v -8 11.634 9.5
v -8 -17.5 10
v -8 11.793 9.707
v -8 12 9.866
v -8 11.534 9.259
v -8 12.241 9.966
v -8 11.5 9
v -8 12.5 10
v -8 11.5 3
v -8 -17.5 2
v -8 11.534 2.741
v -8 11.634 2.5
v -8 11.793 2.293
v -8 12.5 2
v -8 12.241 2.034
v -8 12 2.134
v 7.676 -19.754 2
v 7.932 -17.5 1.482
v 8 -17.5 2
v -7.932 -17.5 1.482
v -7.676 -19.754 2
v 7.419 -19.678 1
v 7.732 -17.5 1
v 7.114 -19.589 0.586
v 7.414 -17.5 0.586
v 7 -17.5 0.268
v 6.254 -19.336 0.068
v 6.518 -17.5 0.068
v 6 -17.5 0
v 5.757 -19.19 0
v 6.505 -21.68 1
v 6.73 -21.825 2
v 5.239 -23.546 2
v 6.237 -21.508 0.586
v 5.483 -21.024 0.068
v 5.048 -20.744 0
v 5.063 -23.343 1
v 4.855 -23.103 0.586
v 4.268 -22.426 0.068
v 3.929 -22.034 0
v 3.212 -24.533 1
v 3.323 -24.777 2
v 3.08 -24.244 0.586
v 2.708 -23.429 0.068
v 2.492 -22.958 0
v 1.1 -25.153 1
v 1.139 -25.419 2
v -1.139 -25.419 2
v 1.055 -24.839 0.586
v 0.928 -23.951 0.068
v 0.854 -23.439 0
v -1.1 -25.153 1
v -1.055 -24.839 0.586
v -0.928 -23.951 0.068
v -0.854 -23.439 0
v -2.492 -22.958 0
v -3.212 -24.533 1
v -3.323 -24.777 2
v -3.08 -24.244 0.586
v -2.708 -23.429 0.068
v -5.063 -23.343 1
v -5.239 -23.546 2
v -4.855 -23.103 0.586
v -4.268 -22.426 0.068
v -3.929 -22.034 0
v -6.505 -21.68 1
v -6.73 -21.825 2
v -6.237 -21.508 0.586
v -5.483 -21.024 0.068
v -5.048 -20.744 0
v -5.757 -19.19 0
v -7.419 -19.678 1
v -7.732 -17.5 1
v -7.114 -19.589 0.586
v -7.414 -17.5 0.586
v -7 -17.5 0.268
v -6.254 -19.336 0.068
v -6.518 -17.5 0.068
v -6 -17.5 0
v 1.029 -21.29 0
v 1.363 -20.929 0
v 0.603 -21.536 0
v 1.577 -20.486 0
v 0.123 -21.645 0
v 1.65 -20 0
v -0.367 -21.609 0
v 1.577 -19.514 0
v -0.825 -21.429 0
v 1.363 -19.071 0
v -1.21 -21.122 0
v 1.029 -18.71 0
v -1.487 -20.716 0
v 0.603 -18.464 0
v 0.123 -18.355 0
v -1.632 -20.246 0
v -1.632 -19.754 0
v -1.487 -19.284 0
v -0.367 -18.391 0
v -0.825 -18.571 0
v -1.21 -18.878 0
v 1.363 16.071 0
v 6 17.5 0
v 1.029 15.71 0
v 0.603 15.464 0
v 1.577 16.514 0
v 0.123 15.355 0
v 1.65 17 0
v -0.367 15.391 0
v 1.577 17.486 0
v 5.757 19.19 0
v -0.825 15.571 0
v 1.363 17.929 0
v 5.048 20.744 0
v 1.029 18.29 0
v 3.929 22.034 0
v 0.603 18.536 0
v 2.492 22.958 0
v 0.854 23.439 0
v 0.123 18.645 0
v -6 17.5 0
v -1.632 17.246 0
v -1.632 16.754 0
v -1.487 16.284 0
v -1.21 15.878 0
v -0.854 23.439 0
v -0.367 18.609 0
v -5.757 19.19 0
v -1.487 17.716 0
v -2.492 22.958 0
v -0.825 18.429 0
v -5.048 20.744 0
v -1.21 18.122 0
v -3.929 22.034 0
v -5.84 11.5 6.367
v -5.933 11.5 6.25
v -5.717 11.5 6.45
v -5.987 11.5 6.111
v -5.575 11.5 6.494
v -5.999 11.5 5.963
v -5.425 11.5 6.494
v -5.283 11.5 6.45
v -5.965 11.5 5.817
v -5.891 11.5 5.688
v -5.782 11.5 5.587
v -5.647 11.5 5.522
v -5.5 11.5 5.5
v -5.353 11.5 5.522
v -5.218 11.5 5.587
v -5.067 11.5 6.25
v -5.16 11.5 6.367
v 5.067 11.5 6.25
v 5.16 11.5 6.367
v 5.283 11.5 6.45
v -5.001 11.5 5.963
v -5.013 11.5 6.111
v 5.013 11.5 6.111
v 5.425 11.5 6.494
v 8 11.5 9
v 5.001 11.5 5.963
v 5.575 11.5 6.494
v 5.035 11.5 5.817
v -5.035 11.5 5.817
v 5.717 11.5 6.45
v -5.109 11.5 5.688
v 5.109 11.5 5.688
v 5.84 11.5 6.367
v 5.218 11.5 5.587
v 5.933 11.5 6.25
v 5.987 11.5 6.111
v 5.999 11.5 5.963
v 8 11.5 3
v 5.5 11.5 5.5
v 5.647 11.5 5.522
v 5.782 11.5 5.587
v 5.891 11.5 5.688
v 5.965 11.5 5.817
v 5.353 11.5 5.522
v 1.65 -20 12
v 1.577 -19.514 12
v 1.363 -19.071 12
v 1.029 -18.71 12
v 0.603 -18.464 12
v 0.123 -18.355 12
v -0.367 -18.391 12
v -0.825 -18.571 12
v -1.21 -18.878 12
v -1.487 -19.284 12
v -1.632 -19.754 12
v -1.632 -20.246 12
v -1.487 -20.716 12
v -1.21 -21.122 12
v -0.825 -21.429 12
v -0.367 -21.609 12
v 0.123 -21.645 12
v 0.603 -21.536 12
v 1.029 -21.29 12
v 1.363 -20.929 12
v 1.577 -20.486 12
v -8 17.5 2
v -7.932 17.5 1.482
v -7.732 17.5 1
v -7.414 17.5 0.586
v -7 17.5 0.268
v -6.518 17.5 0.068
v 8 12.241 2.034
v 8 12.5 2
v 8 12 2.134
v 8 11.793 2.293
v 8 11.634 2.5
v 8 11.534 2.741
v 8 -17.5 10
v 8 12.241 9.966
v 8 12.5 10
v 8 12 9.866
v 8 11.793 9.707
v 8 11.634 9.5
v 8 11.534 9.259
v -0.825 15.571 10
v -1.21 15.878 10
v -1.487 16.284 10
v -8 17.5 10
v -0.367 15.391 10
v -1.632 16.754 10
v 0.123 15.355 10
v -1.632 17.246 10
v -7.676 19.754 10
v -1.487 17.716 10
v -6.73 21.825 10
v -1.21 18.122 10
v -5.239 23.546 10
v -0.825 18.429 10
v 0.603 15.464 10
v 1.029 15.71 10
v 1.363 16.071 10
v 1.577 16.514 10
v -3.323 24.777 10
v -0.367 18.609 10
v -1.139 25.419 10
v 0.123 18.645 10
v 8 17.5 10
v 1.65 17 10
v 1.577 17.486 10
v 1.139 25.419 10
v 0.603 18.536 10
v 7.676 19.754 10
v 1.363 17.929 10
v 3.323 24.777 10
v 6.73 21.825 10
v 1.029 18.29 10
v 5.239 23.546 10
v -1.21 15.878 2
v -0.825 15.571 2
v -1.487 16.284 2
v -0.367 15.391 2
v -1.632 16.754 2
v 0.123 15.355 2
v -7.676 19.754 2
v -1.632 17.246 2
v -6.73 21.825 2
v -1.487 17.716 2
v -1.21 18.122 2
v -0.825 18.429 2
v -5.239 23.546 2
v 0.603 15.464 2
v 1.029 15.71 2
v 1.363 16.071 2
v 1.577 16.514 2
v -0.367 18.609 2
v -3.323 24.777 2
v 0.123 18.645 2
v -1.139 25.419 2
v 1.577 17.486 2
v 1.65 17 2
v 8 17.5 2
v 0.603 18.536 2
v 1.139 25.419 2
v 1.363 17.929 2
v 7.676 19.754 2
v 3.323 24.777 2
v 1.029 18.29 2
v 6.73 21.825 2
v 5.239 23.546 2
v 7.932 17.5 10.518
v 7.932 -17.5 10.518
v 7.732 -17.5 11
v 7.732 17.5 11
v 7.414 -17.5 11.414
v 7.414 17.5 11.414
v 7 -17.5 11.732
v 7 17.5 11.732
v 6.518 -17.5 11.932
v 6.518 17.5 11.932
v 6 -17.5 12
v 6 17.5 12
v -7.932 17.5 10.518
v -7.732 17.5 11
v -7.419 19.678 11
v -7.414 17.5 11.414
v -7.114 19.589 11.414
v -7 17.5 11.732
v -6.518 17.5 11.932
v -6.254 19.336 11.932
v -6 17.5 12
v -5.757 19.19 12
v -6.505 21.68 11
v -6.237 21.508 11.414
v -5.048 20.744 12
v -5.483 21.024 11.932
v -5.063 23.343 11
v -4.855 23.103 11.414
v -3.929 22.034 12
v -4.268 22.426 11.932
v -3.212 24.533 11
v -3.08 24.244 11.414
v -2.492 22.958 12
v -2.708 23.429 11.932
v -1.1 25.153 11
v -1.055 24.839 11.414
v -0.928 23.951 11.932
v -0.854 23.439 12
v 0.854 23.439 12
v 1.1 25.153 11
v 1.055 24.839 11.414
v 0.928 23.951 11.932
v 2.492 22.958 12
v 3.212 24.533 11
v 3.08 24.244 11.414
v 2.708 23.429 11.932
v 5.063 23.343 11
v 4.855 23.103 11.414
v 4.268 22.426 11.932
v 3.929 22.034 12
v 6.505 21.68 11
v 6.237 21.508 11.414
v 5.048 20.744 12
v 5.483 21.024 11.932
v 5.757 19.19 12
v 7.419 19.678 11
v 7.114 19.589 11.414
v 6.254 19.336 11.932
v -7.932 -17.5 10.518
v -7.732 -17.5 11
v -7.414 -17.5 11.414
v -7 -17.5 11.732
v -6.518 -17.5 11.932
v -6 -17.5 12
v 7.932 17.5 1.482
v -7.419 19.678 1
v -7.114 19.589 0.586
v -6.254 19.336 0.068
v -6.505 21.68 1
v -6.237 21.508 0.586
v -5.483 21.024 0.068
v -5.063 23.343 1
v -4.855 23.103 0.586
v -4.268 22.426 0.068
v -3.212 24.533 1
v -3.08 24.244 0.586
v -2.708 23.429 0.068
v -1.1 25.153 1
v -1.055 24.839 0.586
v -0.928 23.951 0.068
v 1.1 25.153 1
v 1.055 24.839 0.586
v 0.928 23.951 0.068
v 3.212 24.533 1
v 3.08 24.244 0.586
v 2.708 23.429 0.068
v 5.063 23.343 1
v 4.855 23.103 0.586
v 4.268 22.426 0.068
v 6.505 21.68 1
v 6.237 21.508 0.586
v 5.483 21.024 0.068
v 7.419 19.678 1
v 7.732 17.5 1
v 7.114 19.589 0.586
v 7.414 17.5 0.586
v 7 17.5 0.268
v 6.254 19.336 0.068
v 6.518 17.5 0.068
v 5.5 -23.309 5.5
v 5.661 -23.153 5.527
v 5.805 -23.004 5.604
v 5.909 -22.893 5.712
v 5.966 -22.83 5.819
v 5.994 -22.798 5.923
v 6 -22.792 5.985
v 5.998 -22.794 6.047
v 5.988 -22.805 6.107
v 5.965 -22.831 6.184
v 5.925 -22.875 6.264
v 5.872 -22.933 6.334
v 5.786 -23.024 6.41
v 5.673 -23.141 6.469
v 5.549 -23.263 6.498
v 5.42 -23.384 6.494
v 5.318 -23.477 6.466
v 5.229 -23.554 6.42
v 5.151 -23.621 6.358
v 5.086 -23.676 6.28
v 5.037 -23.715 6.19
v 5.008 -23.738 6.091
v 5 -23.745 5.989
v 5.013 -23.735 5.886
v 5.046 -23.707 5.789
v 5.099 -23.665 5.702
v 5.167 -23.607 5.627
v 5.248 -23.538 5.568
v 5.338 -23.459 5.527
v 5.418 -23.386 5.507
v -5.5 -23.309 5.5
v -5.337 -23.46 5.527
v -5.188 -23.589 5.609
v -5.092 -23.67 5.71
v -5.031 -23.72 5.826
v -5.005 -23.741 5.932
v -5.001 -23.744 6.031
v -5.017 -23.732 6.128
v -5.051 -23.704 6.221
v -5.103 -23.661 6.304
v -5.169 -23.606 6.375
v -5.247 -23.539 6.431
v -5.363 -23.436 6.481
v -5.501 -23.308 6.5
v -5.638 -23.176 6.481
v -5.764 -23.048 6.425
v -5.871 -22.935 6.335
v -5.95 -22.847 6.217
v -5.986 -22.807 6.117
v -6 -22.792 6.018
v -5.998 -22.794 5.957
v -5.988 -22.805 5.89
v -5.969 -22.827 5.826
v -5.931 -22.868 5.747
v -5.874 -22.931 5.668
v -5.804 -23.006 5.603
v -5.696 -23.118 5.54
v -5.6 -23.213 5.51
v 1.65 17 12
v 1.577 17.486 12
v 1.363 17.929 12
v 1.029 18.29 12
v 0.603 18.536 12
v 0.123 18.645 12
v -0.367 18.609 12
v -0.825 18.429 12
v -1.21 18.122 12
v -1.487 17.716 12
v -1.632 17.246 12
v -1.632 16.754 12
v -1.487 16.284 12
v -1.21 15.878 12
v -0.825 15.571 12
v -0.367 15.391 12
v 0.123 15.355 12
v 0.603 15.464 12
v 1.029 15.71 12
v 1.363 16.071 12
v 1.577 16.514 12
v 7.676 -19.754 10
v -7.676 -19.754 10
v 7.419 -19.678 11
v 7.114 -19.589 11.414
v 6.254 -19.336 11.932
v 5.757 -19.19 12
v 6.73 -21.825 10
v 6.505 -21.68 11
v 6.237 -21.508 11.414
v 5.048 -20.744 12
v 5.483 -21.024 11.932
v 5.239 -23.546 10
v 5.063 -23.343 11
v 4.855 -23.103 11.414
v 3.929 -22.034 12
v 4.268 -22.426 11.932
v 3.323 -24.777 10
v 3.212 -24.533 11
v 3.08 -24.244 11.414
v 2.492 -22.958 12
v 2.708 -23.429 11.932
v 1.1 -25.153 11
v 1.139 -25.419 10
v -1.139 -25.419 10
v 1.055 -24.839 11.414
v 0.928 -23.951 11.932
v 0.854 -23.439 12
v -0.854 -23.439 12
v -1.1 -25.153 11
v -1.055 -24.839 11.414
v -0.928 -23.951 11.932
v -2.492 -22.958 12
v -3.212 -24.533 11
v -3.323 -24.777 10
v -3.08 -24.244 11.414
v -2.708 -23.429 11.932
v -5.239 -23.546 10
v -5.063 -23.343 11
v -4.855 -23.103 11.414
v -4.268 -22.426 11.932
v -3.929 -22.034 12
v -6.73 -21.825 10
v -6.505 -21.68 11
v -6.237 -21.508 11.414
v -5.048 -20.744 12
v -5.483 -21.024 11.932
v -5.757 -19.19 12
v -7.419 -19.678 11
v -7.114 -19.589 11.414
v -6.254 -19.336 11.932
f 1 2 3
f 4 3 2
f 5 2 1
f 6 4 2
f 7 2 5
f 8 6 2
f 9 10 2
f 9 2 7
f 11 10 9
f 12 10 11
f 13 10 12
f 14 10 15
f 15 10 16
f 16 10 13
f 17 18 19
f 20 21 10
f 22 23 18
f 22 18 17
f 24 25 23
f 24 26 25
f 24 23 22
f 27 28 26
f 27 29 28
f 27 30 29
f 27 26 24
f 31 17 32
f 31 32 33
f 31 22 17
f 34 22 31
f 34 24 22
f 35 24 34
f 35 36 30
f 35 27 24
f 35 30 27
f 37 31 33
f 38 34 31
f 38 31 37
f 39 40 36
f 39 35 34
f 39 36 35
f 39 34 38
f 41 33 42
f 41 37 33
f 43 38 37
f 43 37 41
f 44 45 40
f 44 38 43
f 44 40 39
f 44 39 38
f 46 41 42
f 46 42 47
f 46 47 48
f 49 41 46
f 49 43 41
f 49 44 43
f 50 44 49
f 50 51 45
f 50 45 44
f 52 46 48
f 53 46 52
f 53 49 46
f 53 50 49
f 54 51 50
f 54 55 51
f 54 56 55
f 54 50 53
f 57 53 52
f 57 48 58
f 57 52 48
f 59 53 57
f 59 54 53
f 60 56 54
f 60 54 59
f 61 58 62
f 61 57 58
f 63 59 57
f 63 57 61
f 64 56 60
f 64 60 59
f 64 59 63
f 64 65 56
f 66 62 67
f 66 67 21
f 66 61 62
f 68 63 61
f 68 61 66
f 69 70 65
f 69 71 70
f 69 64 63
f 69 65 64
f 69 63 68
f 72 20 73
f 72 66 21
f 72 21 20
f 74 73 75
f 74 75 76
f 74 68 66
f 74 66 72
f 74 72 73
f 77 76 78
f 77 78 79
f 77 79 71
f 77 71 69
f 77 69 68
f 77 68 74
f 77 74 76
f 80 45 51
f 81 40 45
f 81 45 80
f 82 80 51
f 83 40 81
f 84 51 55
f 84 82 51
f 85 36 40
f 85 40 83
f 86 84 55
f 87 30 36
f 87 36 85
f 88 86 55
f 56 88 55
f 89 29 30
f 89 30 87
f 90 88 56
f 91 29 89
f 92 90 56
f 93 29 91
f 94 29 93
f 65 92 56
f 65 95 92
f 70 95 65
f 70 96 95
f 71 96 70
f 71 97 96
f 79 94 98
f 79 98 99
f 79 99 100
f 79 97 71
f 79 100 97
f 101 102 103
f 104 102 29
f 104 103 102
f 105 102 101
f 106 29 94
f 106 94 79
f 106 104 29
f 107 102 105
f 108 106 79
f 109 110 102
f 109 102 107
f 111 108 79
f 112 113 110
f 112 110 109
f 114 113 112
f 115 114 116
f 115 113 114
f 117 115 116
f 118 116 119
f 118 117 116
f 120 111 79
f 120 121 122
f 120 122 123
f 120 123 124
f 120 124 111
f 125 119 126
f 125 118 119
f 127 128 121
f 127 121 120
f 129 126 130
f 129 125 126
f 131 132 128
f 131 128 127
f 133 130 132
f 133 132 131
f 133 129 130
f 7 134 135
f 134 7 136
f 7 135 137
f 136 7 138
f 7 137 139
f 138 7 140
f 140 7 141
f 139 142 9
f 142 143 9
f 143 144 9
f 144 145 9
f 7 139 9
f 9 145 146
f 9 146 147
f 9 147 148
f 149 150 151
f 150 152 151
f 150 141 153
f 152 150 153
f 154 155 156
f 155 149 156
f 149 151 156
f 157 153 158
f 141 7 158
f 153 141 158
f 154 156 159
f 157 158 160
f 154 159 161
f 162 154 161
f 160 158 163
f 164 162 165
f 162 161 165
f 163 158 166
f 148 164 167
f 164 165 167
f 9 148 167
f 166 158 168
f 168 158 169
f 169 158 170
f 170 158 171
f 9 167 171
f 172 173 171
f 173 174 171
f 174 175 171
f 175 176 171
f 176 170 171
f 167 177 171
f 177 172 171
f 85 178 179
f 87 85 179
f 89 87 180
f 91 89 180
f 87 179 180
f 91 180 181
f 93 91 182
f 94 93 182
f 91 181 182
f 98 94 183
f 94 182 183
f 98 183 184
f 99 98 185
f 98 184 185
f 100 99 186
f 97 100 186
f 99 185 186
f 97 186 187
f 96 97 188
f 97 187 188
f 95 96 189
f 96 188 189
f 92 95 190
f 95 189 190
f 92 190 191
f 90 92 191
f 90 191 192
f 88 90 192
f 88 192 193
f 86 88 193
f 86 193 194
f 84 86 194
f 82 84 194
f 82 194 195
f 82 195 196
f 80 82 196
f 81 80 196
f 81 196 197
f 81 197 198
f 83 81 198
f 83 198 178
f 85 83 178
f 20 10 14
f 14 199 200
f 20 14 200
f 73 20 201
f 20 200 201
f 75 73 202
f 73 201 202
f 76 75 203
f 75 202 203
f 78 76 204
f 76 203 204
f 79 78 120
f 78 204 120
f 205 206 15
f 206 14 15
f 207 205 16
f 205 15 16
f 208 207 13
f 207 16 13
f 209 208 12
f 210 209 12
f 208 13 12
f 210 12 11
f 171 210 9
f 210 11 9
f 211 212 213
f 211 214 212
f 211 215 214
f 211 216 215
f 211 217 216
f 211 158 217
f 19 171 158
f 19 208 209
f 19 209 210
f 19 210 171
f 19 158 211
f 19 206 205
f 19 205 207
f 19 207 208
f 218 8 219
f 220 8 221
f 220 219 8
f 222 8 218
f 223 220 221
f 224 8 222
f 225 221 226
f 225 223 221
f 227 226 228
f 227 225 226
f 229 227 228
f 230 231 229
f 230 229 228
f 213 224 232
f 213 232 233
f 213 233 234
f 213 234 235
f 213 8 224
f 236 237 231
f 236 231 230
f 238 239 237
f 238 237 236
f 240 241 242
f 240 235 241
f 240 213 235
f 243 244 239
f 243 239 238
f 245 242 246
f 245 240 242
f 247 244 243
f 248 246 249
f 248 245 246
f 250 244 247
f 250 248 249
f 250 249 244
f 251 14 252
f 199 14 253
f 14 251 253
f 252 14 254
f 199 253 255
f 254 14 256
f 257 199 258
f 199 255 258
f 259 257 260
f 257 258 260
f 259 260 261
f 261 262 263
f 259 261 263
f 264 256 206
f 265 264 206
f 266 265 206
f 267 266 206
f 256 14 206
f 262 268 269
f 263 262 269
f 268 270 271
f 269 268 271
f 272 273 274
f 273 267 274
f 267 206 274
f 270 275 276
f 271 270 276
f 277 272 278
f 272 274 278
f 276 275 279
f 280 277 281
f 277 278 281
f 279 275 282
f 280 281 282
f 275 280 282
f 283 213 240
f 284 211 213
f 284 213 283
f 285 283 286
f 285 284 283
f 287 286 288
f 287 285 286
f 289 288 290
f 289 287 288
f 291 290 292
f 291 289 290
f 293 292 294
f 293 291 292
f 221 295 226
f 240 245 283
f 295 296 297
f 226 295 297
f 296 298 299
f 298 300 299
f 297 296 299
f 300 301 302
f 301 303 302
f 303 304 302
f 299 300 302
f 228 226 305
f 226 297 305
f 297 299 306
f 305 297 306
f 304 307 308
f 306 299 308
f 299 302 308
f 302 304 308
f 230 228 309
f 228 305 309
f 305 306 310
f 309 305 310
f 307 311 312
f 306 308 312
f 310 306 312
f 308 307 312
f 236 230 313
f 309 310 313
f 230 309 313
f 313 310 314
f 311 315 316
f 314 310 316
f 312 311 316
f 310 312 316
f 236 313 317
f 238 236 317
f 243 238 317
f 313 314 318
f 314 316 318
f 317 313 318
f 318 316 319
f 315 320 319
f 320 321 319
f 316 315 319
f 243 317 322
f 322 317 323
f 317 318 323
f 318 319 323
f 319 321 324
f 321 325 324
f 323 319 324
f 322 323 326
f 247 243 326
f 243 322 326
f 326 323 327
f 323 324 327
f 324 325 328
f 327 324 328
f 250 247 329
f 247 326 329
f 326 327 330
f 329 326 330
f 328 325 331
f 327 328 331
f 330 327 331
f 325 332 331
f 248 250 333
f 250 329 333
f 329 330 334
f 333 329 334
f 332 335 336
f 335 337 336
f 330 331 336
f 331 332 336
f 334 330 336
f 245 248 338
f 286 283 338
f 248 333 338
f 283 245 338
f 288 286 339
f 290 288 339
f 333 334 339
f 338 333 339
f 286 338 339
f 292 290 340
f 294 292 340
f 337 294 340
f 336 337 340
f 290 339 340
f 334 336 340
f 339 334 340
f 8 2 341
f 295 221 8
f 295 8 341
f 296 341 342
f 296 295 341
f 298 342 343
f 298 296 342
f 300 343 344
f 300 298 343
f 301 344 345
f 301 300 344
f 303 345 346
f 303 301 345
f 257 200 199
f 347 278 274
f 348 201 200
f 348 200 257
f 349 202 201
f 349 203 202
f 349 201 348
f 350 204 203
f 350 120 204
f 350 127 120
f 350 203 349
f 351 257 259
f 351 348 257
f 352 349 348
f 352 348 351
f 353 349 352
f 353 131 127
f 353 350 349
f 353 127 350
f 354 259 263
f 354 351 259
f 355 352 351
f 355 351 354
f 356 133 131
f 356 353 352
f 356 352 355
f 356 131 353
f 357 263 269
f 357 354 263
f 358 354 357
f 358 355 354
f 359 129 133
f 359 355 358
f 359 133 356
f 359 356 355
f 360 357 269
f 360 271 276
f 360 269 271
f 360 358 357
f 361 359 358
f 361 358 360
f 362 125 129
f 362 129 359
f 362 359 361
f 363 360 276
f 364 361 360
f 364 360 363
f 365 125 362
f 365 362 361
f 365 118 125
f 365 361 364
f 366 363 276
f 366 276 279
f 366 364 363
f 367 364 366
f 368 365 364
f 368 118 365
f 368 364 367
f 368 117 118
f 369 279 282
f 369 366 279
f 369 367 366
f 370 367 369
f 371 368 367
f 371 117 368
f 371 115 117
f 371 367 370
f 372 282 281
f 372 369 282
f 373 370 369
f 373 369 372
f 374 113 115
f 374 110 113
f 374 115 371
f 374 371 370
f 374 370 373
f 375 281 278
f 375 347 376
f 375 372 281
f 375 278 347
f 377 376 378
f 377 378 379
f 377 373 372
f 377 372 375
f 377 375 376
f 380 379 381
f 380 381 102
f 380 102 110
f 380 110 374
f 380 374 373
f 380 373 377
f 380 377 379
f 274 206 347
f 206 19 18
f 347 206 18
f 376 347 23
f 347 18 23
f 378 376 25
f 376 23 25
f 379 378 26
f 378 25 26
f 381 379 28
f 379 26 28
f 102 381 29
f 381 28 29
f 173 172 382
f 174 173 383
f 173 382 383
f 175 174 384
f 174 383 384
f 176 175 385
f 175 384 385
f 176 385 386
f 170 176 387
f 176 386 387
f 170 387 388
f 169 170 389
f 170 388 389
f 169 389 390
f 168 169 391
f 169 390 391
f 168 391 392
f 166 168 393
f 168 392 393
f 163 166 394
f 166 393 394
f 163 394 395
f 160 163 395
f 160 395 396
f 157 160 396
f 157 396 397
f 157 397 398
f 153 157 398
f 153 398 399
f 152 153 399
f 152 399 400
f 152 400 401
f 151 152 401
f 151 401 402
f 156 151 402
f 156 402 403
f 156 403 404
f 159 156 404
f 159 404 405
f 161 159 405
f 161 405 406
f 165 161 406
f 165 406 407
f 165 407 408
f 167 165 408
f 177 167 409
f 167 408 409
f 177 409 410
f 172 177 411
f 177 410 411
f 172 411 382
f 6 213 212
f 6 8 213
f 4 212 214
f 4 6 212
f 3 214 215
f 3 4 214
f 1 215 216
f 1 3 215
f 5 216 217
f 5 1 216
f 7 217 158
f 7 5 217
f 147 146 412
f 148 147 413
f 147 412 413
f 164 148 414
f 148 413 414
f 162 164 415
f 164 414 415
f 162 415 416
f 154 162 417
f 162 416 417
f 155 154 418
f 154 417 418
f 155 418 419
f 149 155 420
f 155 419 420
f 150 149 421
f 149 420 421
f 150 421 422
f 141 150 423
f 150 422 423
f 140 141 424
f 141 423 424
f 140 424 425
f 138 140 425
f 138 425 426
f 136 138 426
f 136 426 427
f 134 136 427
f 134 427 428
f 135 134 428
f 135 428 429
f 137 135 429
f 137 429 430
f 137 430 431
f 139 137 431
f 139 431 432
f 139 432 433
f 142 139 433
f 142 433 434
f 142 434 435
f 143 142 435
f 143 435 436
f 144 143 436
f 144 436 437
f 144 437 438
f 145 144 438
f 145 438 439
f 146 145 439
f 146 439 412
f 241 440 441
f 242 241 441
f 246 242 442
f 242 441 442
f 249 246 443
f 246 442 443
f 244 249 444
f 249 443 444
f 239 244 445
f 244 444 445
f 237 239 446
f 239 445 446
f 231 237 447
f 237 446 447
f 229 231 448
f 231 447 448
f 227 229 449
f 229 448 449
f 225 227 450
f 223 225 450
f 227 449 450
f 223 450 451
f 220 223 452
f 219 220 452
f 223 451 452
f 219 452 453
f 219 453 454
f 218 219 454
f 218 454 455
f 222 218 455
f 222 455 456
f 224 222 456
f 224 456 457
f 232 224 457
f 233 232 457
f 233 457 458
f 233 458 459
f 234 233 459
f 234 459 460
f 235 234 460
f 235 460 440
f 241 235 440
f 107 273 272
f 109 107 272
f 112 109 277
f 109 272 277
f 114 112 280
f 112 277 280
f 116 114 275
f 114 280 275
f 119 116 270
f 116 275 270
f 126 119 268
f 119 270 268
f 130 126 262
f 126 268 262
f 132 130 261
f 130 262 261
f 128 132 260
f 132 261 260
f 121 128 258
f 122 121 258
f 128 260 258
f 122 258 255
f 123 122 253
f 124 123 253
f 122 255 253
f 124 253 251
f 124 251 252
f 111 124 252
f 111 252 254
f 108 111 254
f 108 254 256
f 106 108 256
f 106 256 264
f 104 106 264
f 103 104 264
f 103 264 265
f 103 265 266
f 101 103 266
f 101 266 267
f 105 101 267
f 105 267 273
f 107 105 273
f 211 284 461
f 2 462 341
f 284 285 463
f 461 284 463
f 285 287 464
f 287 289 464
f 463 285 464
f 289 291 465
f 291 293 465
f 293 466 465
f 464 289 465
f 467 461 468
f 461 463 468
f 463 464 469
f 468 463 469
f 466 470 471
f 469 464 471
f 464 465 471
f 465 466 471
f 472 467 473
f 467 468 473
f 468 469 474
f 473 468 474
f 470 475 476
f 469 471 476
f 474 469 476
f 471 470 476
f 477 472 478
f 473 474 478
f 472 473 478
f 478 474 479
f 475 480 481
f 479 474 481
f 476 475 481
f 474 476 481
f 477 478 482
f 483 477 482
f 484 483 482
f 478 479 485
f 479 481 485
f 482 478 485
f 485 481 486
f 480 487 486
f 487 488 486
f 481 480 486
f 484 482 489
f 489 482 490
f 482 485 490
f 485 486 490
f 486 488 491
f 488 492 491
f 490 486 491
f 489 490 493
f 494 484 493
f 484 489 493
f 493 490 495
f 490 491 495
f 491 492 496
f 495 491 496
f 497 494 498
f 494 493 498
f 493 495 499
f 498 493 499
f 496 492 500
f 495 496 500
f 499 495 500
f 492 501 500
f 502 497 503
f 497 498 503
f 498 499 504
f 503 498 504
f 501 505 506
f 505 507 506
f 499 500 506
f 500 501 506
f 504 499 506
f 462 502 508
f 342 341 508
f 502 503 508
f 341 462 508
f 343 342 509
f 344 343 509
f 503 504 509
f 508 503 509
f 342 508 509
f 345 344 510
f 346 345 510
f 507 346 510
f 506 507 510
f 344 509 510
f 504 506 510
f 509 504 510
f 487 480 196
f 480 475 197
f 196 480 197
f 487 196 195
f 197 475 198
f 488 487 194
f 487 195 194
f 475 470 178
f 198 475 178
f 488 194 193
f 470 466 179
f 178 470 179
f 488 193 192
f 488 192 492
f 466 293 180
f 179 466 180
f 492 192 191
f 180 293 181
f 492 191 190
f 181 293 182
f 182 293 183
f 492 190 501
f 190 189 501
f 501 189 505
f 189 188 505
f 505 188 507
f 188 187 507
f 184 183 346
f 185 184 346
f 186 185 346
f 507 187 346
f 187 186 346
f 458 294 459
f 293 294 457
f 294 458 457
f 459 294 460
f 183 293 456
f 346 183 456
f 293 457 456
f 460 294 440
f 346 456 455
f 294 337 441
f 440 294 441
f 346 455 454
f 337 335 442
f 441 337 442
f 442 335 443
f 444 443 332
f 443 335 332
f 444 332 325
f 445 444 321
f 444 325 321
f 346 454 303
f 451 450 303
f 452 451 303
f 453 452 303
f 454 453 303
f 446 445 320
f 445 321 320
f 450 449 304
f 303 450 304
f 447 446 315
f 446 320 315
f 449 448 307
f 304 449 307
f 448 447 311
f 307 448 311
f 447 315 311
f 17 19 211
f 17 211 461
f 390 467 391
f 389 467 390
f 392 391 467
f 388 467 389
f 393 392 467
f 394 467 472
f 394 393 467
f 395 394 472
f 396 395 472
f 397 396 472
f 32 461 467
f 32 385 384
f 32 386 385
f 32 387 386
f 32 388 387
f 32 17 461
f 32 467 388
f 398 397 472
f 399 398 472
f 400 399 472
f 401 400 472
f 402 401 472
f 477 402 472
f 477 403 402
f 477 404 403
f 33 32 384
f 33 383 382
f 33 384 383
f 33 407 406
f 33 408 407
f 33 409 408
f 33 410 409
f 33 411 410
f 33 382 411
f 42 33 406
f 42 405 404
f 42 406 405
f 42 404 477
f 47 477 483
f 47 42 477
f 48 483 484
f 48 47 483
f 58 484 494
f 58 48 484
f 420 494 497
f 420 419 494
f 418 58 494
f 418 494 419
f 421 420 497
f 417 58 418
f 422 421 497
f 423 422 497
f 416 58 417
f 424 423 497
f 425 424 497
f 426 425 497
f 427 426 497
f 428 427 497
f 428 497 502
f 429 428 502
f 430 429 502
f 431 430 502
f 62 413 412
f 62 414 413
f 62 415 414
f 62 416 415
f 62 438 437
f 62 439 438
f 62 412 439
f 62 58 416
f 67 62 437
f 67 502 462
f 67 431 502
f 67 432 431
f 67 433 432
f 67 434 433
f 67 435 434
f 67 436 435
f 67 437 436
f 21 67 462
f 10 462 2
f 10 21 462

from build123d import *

# Parameters (mm, degrees)
BOSS_EXTRUDE1_DEPTH = 12
FILLET1_R           = 2
SKETCH3_W           = 8
SKETCH3_H           = 14
CUT_EXTRUDE1_DEPTH  = 33.407560846
FILLET5_R           = 1
SKETCH4_R           = 1.65
CUT_EXTRUDE2_DEPTH  = 30.295904151
SKETCH6_R           = 0.5
CUT_EXTRUDE3_DEPTH  = 54


with BuildPart() as part:
    # Sketch2 → Boss-Extrude1 (new body)
    with BuildSketch(Plane.XY):
        with BuildLine():
            Line((-8, -17.5), (-8, 17.5))
            ThreePointArc((-8, 17.5), (0, 25.5), (8, 17.5))
            Line((8, 17.5), (8, -17.5))
            ThreePointArc((8, -17.5), (0, -25.5), (-8, -17.5))
        make_face()
    extrude(amount=BOSS_EXTRUDE1_DEPTH)

    # Fillet1
    fillet1_edges = [part.edges().sort_by_distance(p)[0] for p in [
        (0, 25.5, 12),
        (-8, 0, 12),
        (0, -25.5, 12),
        (-8, 0, 0),
        (0, 25.5, 0),
        (8, 0, 0),
        (0, -25.5, 0),
        (8, 0, 12),
    ]]
    fillet(fillet1_edges, radius=FILLET1_R)

    # Sketch3 → Cut-Extrude1 (cut, through all)
    with BuildSketch(Plane(origin=(8, 0, 0), x_dir=(0, 0, -1), z_dir=(1, 0, 0))):
        with Locations((-6, 18.5)):
            Rectangle(SKETCH3_W, SKETCH3_H)
    extrude(amount=-CUT_EXTRUDE1_DEPTH, mode=Mode.SUBTRACT)

    # Fillet5
    fillet5_edges = [part.edges().sort_by_distance(p)[0] for p in [
        (0, 11.5, 10),
        (0, 11.5, 2),
    ]]
    fillet(fillet5_edges, radius=FILLET5_R)

    # Sketch4 → Cut-Extrude2 (cut, through all)
    with BuildSketch(Plane.XY.offset(12)):
        with Locations((0, 17)):
            Circle(SKETCH4_R)
        with Locations((0, -20)):
            Circle(SKETCH4_R)
    extrude(amount=-CUT_EXTRUDE2_DEPTH, mode=Mode.SUBTRACT)

    # Sketch6 → Cut-Extrude3 (cut, through all)
    with BuildSketch(Plane(origin=(0, -25.5, 0), x_dir=(-1, 0, 0), z_dir=(0, -1, 0))):
        with Locations(Location((-5.5, -6, 0), (0, 0, 90))):
            Circle(SKETCH6_R)
        with Locations(Location((5.5, -6, 0), (0, 0, 90))):
            Circle(SKETCH6_R)
    extrude(amount=-CUT_EXTRUDE3_DEPTH, mode=Mode.SUBTRACT)


solid = part.part
